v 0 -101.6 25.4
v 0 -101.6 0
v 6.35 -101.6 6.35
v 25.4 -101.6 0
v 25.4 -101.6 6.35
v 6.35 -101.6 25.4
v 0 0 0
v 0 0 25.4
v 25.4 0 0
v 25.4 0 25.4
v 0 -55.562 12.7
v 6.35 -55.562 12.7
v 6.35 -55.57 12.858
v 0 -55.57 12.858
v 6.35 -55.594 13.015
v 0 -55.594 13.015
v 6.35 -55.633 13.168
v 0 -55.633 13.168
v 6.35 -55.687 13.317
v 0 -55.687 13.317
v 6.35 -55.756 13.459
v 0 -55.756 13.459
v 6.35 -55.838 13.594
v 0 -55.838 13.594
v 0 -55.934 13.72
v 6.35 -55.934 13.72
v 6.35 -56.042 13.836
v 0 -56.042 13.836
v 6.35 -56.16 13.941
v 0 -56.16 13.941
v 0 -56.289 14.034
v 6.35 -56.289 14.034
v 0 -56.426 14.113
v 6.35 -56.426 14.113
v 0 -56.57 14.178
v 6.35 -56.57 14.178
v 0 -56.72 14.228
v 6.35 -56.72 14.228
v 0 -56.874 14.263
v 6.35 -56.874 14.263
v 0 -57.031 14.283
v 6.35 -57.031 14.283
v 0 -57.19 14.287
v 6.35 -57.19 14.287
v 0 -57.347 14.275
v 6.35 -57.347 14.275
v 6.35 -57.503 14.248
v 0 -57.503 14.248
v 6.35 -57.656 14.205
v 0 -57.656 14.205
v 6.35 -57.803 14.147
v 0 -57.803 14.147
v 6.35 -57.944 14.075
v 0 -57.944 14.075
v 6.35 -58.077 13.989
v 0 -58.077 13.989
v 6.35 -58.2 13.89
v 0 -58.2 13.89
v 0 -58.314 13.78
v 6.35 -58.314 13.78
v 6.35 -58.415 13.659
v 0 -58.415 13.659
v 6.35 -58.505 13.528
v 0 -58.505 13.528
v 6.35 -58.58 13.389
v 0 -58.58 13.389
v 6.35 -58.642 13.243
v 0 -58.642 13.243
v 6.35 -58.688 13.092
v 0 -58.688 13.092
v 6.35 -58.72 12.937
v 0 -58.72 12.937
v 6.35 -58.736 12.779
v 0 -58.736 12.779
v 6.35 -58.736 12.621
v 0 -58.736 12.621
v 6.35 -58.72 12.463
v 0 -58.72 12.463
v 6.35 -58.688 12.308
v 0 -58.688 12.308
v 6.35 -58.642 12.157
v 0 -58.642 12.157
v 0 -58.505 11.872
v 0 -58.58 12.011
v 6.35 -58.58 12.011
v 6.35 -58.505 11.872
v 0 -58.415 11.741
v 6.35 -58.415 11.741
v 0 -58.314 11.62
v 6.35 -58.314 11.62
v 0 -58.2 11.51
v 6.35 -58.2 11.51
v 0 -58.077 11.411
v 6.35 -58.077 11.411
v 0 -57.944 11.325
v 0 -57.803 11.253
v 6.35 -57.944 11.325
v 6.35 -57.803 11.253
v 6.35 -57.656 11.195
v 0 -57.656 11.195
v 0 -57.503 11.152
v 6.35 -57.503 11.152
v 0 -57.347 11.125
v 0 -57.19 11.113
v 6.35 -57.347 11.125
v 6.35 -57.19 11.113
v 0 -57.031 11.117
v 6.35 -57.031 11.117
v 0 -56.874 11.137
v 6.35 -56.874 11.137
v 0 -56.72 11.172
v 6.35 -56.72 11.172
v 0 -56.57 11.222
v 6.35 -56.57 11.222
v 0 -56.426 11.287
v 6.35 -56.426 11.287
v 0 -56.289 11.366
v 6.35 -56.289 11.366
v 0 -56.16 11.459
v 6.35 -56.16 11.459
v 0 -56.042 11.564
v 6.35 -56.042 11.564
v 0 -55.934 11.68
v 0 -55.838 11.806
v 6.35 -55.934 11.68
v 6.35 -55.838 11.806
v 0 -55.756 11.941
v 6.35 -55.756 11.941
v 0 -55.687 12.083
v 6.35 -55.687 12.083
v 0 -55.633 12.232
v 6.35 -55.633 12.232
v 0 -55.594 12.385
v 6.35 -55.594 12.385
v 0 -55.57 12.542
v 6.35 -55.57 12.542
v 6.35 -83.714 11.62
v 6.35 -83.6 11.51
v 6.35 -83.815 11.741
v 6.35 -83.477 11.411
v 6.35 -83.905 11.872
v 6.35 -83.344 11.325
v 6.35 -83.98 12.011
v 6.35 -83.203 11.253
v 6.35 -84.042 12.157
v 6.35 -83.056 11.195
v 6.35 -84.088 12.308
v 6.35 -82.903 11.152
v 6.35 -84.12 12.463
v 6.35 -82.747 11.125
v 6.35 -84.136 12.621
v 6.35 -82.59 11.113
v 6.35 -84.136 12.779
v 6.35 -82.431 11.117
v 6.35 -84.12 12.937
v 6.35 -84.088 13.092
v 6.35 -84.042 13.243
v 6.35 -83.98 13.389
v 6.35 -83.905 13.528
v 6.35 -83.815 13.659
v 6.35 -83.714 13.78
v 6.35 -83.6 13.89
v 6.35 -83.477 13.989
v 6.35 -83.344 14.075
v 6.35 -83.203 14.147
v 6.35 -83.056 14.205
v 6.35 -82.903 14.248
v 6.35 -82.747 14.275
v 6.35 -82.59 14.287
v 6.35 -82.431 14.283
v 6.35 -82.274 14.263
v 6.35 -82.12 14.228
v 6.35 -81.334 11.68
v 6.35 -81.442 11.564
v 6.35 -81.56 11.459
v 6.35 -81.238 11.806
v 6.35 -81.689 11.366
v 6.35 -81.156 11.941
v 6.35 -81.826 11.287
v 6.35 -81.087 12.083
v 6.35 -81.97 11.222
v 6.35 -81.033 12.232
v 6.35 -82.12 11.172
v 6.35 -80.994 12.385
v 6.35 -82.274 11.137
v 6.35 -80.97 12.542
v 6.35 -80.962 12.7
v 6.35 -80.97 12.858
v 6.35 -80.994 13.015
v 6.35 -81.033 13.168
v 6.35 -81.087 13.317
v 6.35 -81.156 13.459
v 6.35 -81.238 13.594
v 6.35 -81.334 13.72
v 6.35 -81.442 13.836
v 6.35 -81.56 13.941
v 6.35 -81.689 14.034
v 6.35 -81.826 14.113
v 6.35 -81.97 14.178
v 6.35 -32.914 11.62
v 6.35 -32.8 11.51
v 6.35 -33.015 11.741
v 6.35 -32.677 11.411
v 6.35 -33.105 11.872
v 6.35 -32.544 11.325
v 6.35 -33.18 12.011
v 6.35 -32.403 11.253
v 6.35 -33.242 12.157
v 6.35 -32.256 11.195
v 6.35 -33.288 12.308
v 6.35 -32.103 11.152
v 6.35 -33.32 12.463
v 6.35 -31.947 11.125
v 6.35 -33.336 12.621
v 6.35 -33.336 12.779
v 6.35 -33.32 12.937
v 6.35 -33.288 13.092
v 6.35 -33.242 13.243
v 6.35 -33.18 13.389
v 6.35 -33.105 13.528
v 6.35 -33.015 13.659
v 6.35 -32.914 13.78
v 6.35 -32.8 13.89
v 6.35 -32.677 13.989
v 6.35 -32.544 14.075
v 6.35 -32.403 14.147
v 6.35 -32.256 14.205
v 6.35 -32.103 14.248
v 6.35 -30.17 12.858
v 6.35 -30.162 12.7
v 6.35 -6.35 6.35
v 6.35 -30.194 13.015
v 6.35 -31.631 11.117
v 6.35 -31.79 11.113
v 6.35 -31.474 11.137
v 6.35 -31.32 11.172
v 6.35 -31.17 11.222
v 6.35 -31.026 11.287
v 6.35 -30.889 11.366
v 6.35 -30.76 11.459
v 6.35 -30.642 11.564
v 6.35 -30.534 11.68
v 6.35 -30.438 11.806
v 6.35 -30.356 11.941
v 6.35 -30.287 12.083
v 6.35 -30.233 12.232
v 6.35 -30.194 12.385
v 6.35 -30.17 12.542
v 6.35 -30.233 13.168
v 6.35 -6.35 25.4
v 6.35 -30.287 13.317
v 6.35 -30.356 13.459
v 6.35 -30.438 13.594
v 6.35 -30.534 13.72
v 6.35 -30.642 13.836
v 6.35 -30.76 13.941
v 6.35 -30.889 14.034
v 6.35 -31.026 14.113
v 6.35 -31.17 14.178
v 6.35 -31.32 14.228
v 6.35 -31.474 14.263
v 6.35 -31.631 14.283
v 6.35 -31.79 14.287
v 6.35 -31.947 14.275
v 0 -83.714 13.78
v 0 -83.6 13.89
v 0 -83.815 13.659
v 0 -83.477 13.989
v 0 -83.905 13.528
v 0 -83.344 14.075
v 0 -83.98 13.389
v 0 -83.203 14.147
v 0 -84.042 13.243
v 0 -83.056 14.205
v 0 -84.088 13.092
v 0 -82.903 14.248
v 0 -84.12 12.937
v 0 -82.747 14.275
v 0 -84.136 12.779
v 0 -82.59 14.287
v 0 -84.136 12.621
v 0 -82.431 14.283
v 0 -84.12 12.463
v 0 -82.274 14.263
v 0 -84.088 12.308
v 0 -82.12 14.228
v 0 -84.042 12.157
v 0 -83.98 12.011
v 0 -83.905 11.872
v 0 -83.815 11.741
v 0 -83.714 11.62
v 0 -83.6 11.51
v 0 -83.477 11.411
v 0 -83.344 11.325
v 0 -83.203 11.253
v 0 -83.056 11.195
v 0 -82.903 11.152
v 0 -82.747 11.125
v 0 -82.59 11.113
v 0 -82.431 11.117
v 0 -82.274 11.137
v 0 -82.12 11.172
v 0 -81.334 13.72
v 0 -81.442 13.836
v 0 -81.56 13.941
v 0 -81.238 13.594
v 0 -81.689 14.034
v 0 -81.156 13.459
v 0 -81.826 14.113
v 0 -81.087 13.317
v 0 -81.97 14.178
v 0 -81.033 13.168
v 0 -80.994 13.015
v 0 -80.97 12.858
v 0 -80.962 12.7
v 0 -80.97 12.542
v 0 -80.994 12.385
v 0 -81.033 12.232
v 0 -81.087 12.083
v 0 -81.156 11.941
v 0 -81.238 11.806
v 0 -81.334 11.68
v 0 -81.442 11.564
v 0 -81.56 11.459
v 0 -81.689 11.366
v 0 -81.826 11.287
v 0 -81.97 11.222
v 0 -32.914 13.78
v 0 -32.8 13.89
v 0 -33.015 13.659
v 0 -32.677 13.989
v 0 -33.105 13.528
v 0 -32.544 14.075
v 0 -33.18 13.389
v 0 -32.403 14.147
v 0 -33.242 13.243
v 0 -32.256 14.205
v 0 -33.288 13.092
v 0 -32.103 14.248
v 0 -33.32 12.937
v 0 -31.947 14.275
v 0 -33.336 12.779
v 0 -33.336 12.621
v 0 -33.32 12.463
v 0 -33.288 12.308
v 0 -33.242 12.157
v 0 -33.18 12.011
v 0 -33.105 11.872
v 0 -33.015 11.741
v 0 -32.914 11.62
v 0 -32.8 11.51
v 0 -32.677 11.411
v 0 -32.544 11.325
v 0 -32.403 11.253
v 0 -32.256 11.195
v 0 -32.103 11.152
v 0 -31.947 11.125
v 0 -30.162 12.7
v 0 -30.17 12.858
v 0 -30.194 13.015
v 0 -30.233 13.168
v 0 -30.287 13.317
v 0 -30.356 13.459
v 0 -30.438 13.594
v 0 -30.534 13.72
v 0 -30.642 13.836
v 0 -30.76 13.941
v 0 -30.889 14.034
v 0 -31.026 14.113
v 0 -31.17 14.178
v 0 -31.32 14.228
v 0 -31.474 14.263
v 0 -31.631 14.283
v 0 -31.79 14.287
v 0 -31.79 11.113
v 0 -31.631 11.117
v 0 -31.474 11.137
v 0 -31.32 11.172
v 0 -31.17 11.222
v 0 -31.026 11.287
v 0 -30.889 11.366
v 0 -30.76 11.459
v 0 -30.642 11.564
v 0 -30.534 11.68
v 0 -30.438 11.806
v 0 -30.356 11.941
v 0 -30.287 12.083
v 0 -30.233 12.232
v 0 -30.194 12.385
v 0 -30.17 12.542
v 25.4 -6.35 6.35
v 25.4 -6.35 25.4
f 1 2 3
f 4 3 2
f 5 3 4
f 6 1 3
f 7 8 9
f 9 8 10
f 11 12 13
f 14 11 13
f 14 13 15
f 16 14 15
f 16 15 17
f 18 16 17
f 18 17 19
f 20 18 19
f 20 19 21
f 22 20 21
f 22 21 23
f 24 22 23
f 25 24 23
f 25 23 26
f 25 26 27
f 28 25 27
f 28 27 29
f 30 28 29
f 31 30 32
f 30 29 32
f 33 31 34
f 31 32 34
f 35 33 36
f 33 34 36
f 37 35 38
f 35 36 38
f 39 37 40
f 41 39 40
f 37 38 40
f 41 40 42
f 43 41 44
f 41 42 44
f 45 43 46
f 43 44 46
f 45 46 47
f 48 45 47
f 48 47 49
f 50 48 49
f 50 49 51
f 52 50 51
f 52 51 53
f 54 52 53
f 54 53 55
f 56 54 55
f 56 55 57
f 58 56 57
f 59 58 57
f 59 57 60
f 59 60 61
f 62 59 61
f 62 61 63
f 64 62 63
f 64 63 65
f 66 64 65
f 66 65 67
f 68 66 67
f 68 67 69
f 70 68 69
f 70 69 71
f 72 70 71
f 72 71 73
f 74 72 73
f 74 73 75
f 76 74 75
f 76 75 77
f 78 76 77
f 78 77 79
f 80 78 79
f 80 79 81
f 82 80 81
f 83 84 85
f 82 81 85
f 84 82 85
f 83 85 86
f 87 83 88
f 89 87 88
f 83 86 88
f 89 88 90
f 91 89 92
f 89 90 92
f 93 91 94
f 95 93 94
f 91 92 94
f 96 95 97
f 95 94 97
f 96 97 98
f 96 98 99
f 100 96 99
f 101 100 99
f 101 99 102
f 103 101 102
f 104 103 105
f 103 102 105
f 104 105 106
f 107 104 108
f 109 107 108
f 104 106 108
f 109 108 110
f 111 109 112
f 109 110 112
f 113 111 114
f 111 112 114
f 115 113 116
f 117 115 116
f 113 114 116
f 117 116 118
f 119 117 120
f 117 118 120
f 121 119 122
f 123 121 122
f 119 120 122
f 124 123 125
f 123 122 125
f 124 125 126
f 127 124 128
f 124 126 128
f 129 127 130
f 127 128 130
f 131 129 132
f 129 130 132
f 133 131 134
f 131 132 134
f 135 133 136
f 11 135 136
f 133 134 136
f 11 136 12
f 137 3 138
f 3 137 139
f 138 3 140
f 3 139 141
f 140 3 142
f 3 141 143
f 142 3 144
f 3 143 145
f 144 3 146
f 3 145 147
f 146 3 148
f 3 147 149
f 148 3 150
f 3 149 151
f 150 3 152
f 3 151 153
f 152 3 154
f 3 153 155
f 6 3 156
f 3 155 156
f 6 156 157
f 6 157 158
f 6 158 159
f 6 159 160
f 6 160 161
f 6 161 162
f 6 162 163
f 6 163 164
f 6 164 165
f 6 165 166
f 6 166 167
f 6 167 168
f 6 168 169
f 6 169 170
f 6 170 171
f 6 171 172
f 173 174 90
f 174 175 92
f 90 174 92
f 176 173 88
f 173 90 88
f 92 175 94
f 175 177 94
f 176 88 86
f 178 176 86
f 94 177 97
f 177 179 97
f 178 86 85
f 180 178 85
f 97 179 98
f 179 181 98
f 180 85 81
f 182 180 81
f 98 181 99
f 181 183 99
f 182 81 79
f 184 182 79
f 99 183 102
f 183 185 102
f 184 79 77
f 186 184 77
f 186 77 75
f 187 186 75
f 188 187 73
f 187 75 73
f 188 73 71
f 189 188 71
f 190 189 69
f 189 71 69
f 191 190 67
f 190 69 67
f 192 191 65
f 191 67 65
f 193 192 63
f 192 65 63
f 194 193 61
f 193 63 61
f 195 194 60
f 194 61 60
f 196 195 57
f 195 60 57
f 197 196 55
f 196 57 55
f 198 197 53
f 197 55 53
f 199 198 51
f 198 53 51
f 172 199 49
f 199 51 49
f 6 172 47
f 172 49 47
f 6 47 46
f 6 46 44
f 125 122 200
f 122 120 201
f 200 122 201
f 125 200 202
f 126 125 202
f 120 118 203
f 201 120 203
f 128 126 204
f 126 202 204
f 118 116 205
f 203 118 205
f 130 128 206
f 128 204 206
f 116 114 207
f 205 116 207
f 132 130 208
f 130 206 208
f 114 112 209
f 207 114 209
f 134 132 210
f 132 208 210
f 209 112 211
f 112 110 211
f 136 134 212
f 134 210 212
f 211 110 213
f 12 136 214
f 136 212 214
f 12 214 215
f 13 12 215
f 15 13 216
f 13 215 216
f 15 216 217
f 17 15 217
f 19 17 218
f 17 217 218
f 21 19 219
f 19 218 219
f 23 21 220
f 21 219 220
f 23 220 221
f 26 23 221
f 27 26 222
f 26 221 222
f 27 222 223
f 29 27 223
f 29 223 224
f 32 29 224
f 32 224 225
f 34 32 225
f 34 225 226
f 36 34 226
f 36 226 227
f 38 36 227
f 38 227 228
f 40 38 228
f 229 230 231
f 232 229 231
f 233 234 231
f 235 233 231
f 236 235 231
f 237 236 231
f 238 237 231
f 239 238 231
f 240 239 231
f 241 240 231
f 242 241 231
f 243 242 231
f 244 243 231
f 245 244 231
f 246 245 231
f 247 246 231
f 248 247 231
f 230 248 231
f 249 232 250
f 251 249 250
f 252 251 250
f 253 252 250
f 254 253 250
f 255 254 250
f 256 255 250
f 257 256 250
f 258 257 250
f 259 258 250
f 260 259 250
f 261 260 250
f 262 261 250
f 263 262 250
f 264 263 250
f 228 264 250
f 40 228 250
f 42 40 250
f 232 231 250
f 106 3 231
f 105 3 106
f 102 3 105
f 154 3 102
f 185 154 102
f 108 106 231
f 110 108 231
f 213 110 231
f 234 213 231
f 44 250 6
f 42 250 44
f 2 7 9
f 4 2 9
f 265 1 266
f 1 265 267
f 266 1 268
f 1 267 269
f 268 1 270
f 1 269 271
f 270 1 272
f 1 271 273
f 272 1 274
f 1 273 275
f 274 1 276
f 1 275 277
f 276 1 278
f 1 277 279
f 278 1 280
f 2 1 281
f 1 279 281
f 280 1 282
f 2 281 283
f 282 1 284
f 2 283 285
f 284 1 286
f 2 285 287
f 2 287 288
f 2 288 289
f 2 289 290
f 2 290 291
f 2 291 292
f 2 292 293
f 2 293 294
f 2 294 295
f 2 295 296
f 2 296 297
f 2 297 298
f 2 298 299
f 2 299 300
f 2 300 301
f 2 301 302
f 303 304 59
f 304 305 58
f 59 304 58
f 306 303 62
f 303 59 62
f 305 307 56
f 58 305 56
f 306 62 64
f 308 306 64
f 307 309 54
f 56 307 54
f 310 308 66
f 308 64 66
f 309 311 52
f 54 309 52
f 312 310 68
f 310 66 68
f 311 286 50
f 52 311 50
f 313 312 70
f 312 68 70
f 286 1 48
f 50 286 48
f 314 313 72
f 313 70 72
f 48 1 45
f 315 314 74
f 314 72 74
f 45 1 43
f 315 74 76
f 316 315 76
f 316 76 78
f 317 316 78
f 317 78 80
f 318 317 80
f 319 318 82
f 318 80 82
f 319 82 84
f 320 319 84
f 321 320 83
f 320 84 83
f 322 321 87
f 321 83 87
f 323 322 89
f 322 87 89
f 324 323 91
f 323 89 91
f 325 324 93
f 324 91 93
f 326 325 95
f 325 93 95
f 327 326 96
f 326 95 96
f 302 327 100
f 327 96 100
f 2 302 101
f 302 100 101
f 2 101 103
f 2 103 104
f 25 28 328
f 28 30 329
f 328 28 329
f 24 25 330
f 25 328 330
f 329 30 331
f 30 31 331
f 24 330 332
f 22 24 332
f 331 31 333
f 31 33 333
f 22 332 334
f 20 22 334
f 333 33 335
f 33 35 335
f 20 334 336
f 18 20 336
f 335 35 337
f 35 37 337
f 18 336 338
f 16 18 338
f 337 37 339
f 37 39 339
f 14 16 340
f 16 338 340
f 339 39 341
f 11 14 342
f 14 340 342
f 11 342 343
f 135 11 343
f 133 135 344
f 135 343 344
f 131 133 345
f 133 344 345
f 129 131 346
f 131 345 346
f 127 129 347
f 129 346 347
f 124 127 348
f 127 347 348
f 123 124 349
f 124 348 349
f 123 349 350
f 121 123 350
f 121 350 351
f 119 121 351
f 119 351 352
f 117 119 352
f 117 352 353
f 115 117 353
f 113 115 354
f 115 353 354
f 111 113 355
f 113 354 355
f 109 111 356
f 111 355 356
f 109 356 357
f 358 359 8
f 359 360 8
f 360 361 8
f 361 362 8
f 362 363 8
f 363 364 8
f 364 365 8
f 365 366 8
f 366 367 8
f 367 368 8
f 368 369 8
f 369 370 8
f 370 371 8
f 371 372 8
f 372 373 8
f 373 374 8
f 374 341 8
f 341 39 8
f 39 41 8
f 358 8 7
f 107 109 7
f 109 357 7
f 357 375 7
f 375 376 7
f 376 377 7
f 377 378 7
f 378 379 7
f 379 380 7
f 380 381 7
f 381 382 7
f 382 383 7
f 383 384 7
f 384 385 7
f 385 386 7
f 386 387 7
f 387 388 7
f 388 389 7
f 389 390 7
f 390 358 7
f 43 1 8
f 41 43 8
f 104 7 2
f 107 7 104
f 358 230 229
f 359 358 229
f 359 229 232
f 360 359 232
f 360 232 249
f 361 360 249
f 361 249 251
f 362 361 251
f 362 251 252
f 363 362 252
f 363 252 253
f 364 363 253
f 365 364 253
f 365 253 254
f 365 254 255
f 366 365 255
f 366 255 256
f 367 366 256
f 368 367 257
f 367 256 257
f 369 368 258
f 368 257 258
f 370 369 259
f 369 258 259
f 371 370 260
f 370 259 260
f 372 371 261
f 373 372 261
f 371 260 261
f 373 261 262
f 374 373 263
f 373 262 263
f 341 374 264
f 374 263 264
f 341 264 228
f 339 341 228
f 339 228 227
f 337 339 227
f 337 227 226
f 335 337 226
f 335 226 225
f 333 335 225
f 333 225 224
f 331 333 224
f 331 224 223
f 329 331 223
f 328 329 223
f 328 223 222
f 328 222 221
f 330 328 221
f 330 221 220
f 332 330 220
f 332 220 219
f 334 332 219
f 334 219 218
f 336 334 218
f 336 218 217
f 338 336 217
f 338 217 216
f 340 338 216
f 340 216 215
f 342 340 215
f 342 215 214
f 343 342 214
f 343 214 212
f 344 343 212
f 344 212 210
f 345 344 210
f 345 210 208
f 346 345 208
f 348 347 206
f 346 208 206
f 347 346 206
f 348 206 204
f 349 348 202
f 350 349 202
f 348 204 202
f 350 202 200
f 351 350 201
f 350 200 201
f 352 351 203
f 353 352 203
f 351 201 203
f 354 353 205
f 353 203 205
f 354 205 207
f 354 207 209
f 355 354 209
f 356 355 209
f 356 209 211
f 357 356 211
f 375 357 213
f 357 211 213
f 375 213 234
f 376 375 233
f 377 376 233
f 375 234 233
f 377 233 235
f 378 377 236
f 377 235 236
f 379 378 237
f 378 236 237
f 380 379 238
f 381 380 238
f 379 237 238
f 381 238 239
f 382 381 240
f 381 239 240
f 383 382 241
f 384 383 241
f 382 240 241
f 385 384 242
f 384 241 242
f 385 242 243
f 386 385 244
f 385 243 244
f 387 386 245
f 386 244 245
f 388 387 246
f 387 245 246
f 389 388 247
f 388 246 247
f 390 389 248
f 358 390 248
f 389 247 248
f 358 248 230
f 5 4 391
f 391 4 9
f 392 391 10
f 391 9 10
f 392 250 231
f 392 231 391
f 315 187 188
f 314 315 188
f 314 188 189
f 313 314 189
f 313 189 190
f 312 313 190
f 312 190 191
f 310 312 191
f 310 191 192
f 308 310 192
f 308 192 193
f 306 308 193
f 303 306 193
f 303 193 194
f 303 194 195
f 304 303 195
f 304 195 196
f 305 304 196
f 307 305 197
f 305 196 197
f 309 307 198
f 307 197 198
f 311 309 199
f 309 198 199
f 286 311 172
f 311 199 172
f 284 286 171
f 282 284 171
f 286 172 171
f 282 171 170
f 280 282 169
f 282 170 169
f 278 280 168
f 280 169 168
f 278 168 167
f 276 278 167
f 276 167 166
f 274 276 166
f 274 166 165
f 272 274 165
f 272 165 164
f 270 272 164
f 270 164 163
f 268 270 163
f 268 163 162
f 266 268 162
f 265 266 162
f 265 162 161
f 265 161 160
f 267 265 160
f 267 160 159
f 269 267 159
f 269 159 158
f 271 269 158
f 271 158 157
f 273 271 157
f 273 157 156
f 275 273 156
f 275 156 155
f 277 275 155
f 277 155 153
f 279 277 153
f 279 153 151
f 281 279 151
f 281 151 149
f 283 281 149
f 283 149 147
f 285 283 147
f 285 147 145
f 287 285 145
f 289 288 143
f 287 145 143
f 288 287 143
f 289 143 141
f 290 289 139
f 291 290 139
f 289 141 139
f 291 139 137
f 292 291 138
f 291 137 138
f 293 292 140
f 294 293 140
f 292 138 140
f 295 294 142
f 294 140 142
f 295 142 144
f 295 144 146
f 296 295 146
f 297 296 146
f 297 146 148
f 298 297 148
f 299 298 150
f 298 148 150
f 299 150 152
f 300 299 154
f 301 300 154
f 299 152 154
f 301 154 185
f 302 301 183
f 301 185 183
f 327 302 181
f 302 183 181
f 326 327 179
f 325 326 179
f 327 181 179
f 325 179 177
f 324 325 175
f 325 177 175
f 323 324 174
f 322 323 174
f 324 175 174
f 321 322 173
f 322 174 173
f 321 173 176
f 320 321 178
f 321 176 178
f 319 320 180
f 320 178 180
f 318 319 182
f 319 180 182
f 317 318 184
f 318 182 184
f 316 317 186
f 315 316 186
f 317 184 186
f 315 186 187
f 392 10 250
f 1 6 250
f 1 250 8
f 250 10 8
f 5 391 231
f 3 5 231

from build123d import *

# Parameters (mm, degrees)
F1_DEPTH = 101.6
F2_W     = 25.4
F2_H     = 25.4
F3_DEPTH = 6.35
F4_R     = 1.5875
F5_DEPTH = 25.4


with BuildPart() as f1:
    # F0 (on Front) → F1 (new body)
    with BuildSketch(Plane.XZ):
        Polygon((0, 25.4), (0, 0), (25.4, 0), (25.4, 6.35), (6.35, 6.35), (6.35, 25.4), align=None)
    extrude(amount=F1_DEPTH)

    # F2 (on Front) → F3 (join)
    with BuildSketch(Plane.XZ):
        with Locations((12.7, 12.7)):
            Rectangle(F2_W, F2_H)
    extrude(amount=F3_DEPTH)

    # F4 (on face) → F5 (cut)
    with BuildSketch(Plane.YZ.offset(6.35)):
        with Locations((-31.75, 12.7)):
            Circle(F4_R)
        with Locations((-57.15, 12.7)):
            Circle(F4_R)
        with Locations((-82.55, 12.7)):
            Circle(F4_R)
    extrude(amount=-F5_DEPTH, mode=Mode.SUBTRACT)


solid = f1.part
